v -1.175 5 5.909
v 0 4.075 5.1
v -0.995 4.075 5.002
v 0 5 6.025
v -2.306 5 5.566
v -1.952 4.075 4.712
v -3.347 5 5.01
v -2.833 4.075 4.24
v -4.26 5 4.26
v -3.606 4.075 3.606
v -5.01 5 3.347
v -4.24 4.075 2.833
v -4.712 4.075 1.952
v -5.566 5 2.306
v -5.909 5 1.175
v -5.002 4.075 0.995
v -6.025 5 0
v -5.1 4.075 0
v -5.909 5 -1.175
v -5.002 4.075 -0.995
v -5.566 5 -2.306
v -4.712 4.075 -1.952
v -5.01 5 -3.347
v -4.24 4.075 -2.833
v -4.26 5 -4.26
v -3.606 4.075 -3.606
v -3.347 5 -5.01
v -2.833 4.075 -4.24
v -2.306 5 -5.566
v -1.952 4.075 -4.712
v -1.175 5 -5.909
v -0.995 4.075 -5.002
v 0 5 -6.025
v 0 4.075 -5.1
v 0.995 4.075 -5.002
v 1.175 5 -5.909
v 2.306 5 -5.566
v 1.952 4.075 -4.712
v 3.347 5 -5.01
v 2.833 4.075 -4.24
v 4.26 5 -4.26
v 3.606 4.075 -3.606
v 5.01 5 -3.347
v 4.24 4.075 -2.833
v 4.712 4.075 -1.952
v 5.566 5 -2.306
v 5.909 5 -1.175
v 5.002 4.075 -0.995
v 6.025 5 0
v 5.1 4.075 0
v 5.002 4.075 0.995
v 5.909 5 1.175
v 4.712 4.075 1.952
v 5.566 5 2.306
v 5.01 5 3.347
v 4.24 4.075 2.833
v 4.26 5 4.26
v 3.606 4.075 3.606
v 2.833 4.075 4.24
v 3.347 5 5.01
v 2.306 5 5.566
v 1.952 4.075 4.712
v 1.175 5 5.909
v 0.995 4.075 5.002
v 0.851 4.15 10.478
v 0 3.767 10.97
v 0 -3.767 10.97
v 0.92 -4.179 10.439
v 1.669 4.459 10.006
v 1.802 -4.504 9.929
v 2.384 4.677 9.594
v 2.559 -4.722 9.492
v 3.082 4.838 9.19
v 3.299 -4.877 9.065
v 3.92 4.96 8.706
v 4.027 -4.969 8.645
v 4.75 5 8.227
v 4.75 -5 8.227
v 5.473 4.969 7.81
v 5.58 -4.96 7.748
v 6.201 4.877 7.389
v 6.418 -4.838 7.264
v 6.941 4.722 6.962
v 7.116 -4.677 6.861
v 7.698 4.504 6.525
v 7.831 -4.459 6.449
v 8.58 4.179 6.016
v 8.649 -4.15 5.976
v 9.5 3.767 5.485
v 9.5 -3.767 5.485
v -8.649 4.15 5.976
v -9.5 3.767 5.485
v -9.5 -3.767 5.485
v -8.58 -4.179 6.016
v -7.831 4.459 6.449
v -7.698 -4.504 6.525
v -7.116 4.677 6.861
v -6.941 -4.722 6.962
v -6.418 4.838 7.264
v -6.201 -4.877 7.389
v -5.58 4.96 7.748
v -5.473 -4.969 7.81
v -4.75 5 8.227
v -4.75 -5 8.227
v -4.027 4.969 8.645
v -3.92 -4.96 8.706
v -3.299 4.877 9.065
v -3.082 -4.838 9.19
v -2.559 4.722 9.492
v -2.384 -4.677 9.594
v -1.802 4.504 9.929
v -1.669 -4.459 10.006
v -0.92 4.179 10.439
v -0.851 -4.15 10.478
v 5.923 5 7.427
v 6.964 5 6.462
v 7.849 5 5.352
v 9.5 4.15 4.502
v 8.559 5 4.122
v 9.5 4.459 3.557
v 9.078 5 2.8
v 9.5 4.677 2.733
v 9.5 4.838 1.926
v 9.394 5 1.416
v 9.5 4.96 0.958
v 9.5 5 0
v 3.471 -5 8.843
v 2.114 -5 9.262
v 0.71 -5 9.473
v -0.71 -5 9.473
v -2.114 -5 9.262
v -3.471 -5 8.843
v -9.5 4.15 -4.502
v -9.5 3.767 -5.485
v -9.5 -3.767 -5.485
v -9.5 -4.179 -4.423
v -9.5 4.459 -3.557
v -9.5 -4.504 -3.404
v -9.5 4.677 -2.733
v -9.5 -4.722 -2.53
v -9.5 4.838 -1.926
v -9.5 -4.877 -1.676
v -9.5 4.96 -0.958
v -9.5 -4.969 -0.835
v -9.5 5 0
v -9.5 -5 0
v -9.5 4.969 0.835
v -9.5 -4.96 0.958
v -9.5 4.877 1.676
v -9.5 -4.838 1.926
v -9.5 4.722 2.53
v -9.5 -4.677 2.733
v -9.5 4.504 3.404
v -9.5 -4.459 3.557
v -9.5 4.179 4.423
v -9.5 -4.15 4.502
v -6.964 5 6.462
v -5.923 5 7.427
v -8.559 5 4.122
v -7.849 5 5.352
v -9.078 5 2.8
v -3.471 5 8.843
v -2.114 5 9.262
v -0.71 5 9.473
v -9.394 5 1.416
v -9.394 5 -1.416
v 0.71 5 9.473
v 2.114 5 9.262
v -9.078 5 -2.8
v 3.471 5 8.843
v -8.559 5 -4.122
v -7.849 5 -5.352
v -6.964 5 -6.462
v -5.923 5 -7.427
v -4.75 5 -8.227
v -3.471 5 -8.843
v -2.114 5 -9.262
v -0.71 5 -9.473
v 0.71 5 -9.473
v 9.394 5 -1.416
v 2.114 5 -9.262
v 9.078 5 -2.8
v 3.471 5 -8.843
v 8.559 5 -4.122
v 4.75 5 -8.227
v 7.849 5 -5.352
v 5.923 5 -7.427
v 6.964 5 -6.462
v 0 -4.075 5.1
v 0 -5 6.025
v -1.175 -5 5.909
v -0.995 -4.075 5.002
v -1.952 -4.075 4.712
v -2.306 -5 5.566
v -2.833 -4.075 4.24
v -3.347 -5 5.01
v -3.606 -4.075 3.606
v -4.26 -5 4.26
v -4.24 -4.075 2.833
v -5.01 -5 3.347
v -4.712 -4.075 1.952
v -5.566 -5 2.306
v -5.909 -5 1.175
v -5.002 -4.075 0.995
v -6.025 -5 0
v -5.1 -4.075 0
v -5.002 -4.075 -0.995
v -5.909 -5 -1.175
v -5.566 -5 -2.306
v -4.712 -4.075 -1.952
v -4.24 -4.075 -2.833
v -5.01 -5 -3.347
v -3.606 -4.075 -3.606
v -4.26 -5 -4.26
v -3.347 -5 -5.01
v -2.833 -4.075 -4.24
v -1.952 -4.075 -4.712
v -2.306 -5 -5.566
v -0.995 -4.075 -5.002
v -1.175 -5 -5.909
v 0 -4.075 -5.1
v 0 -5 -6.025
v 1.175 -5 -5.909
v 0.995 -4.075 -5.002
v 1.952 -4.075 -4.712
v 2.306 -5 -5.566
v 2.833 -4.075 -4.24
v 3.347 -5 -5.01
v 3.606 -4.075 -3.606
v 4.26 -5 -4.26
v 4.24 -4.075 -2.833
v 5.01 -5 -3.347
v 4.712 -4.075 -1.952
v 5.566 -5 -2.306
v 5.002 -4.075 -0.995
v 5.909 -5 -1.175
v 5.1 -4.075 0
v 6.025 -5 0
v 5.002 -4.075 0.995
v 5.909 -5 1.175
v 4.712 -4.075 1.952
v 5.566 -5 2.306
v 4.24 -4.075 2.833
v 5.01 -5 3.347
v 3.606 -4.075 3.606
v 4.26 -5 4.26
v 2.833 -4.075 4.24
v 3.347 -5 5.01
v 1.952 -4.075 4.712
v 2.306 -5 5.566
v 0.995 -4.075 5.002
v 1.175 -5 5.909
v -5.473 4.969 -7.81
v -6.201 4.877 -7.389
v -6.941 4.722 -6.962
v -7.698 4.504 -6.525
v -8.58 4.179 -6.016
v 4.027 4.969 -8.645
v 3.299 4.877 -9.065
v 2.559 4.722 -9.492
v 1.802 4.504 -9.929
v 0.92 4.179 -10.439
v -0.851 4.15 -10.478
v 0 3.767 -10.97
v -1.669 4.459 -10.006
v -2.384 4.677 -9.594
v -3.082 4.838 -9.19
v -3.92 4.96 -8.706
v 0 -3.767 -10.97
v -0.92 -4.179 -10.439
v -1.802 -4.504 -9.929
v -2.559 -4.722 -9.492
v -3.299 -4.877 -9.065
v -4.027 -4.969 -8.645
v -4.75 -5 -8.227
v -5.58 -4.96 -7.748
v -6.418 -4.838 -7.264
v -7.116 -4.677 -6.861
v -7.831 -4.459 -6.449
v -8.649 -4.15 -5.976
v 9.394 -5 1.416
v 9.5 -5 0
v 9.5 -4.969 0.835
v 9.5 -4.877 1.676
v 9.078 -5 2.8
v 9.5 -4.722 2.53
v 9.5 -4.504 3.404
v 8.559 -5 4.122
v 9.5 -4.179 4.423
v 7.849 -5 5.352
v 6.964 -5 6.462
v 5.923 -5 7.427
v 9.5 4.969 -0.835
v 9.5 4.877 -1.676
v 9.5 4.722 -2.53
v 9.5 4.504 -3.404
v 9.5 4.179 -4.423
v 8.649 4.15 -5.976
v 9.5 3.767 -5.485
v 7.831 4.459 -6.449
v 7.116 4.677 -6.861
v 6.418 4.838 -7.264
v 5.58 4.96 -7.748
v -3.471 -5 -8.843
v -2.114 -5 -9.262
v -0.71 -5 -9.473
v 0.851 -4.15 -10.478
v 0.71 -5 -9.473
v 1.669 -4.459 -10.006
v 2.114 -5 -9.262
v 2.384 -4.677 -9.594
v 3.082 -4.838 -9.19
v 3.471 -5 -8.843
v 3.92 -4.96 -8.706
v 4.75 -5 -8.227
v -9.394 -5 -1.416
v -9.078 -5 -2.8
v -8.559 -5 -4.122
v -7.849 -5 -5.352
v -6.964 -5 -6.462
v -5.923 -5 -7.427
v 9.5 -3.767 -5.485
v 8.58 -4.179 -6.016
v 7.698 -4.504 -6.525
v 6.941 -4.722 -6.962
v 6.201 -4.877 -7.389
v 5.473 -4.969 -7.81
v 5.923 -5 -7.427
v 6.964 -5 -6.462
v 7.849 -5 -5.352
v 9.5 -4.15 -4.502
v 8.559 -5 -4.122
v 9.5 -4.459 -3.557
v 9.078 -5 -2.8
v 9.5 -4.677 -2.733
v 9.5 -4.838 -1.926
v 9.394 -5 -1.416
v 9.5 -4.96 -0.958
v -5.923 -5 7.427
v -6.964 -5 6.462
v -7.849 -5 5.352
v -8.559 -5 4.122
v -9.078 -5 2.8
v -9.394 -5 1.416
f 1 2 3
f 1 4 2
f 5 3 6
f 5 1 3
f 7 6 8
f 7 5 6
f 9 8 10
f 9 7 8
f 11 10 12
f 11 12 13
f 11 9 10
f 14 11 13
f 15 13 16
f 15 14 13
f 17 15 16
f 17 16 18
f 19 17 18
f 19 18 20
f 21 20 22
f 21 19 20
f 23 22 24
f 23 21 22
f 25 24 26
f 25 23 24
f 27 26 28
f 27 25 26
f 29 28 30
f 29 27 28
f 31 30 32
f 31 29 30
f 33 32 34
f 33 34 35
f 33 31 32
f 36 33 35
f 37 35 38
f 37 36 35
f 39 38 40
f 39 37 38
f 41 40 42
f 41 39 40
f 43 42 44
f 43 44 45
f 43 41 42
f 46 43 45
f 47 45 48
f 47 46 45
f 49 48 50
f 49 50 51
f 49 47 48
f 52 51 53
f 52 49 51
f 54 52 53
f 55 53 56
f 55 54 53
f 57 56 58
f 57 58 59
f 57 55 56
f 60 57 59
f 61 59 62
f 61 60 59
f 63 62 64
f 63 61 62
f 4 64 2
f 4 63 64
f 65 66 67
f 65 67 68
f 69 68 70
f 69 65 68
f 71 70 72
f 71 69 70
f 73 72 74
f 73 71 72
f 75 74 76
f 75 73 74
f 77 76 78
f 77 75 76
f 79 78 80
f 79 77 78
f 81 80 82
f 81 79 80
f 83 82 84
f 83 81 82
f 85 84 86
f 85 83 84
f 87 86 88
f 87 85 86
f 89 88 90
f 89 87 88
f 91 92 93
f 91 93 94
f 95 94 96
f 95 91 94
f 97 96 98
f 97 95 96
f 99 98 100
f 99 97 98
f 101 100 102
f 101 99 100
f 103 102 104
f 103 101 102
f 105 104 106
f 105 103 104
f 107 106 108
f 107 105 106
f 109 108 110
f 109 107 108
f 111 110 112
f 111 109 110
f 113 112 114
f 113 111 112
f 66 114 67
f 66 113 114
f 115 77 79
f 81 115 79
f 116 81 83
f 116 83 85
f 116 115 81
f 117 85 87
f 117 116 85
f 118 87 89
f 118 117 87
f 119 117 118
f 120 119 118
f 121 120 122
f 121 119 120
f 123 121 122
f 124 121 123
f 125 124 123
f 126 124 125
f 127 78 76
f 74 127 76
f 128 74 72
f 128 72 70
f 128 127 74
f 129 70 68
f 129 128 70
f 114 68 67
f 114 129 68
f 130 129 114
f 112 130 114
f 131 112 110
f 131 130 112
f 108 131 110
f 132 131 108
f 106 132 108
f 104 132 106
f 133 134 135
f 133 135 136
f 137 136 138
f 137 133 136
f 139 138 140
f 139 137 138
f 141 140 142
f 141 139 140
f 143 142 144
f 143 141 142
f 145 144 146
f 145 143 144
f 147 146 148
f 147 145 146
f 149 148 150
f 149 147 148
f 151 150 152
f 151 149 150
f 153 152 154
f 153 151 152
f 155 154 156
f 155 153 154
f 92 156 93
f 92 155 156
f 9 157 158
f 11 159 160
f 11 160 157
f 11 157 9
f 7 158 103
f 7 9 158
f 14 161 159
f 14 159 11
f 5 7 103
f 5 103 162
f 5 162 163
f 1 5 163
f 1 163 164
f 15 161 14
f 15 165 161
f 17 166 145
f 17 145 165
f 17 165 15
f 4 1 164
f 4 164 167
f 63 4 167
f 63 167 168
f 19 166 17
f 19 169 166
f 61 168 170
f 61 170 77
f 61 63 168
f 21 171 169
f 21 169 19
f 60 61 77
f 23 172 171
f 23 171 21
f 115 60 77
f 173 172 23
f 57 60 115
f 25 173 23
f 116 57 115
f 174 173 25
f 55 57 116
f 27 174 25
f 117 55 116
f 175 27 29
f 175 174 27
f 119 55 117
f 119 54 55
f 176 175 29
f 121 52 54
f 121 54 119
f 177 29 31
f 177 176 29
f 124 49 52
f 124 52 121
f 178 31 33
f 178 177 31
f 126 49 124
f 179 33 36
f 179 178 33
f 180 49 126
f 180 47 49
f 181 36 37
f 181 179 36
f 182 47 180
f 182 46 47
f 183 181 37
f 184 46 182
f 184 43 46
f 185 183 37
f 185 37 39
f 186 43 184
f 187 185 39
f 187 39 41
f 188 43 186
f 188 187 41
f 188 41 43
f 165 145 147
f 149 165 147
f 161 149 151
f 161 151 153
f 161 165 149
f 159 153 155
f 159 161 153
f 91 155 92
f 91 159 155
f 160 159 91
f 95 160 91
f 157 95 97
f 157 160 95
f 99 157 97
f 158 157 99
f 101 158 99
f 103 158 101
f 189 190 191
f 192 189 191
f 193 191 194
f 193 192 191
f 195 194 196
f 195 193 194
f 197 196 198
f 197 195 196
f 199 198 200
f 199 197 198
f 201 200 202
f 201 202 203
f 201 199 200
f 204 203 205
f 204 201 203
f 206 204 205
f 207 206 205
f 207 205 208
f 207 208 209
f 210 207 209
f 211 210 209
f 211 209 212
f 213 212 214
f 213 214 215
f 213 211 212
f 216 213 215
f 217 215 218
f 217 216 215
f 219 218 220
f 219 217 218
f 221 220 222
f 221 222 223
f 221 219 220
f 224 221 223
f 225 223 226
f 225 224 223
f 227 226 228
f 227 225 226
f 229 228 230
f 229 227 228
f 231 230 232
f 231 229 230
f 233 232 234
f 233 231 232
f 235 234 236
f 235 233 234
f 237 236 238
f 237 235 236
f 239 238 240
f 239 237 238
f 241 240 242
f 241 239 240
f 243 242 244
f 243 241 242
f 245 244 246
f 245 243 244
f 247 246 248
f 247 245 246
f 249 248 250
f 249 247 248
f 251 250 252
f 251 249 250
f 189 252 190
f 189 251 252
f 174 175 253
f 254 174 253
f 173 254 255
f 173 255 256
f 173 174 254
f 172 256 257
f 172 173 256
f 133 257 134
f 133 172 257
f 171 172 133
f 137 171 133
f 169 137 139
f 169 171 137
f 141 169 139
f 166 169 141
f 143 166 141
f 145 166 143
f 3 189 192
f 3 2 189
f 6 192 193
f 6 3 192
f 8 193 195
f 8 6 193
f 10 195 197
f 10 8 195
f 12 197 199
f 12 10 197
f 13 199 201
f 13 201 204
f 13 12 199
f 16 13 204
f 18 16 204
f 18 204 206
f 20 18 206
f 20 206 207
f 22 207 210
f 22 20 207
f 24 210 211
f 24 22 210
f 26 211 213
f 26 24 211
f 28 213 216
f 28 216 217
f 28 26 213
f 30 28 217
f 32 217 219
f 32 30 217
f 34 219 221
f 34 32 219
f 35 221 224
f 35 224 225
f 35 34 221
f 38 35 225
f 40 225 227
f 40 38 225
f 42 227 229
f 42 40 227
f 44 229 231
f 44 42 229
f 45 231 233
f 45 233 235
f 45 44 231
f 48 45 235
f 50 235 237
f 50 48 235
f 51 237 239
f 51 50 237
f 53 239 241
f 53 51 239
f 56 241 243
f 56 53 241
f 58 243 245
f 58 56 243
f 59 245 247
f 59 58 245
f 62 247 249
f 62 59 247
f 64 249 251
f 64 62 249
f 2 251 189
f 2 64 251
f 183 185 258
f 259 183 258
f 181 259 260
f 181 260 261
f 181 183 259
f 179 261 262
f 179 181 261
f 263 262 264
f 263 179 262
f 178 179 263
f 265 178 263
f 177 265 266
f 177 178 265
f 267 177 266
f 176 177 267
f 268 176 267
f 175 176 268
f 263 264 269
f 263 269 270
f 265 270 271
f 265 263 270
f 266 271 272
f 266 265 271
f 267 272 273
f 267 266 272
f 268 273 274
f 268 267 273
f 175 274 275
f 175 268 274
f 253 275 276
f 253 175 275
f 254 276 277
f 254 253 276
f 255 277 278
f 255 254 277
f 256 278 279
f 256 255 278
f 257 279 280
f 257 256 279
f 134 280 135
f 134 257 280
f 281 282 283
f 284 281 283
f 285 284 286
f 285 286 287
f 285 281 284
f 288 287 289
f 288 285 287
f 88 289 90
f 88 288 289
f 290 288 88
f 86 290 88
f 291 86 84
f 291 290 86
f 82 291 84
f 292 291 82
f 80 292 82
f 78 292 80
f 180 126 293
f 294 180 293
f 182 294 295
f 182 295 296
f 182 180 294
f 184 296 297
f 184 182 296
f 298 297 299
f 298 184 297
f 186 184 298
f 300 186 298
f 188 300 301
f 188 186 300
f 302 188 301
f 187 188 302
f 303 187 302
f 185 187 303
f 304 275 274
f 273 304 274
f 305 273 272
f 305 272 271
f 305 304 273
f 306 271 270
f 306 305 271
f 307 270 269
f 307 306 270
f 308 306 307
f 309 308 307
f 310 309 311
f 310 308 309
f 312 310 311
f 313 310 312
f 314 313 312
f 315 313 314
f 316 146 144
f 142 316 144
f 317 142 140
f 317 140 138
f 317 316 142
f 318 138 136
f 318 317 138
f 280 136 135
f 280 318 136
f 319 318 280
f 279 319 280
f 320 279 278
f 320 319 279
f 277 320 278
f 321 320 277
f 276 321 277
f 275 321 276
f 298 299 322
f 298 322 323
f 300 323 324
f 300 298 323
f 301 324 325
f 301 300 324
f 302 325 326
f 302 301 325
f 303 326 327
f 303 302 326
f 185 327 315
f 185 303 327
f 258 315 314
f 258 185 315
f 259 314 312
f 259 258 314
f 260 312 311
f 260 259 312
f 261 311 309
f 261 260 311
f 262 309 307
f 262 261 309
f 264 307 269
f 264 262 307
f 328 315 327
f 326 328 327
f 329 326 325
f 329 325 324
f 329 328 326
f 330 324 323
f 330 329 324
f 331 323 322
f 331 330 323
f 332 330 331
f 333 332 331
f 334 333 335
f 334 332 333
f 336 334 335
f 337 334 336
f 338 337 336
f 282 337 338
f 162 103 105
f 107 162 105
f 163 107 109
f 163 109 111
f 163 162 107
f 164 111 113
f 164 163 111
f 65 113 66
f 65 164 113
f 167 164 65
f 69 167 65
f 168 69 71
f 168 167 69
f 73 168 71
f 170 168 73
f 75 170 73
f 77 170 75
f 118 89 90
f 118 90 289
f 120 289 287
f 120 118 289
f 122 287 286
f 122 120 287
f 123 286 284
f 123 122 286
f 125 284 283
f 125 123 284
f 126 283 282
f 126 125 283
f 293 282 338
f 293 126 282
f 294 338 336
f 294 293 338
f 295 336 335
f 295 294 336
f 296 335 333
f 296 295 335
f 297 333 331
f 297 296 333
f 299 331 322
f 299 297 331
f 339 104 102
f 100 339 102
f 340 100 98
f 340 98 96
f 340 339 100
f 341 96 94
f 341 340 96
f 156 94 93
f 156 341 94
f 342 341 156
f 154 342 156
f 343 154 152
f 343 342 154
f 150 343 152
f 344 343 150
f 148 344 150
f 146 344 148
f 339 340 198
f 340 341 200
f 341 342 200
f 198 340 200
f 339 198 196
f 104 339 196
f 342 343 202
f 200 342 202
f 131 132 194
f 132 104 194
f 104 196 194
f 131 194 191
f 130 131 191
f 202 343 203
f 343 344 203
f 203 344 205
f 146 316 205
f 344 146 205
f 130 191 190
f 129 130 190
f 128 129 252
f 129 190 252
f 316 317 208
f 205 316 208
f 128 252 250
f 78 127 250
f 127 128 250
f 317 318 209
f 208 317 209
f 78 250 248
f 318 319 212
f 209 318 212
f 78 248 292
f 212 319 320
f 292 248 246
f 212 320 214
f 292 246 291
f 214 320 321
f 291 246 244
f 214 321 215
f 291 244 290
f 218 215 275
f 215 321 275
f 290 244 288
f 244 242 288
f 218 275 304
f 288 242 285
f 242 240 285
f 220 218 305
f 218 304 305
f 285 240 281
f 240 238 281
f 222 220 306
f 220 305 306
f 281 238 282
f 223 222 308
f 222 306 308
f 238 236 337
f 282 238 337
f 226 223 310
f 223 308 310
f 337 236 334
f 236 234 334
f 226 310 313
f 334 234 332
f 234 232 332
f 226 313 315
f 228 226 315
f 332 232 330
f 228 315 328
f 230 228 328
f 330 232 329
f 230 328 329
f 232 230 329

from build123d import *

# Parameters (mm, degrees)
BOSS_EXTRUDE1_DEPTH     = 5
SKETCH5_OUTSIDE_W       = 50.974
SKETCH5_OUTSIDE_H       = 53.914
SKETCH5_OUTSIDE_R       = 9.5
CUT_EXTRUDE1_DEPTH      = 10
CUT_EXTRUDE1_DRAFT      = -50
MIRROR1_COPY_1_SKETCH_W = 50.974
MIRROR1_COPY_1_SKETCH_H = 53.914
MIRROR1_COPY_1_SKETCH_R = 9.5
MIRROR1_COPY_1_DEPTH    = 10
MIRROR1_COPY_1_DRAFT    = -50


with BuildPart() as part:
    # Sketch1 → Boss-Extrude1 (new, symmetric)
    with BuildSketch(Plane(origin=(0, 0, 0), x_dir=(1, 0, 0), z_dir=(0, 1, 0))):
        Polygon((0, 10.969655115), (-9.5, 5.484827557), (-9.5, -5.484827557), (0, -10.969655115), (9.5, -5.484827557), (9.5, 5.484827557), align=None)
    extrude(amount=BOSS_EXTRUDE1_DEPTH, both=True)

    # Sketch4 → M12 Tapped Hole1 (revolve, cut)
    with BuildSketch(Plane(origin=(0, 5, 0), x_dir=(0, 0, 1), z_dir=(1, 0, 0))):
        Polygon((0, 0), (0, 10), (6.025, 10), (5.1, 9.075), (5.1, 0.925), (6.025, 0), align=None)
    revolve(axis=Axis((0, 11.35, 0), (0, -1, 0)), mode=Mode.SUBTRACT)


with BuildPart() as cut_extrude1_tool:
    # Sketch5 outside → Cut-Extrude1 (with draft: the straight prism first)
    with BuildSketch(Plane(origin=(0, 5, 0), x_dir=(1, 0, 0), z_dir=(0, 1, 0))):
        Rectangle(SKETCH5_OUTSIDE_W, SKETCH5_OUTSIDE_H)
        Circle(SKETCH5_OUTSIDE_R, mode=Mode.SUBTRACT)
    extrude(amount=-CUT_EXTRUDE1_DEPTH)
    # Cut-Extrude1: the draft: its side faces are tilted about the plane it starts from
    cut_extrude1_sides = [cut_extrude1_tool.faces().sort_by_distance(p)[0] for p in [
        (0, 0, 26.957),
        (25.487, 0, 0),
        (0, 0, -26.957),
        (-25.487, 0, 0),
        (-9.5, 0, 0),
    ]]
    draft(cut_extrude1_sides, Plane(origin=(0, 5, 0), x_dir=(1, 0, 0), z_dir=(0, 1, 0)), CUT_EXTRUDE1_DRAFT)


with BuildPart() as part_1:
    add(part.part)

    # Cut-Extrude1: cut by cut_extrude1_tool
    add(cut_extrude1_tool.part, mode=Mode.SUBTRACT)


with BuildPart() as mirror1_copy_1_tool:
    # Mirror1 copy 1 sketch → Mirror1 copy 1 (with draft: the straight prism first)
    with BuildSketch(Plane.XZ.offset(5)):
        Rectangle(MIRROR1_COPY_1_SKETCH_W, MIRROR1_COPY_1_SKETCH_H)
        Circle(MIRROR1_COPY_1_SKETCH_R, mode=Mode.SUBTRACT)
    extrude(amount=-MIRROR1_COPY_1_DEPTH)
    # Mirror1 copy 1: the draft: its side faces are tilted about the plane it starts from
    mirror1_copy_1_sides = [mirror1_copy_1_tool.faces().sort_by_distance(p)[0] for p in [
        (0, 0, 26.957),
        (25.487, 0, 0),
        (0, 0, -26.957),
        (-25.487, 0, 0),
        (-9.5, 0, 0),
    ]]
    draft(mirror1_copy_1_sides, Plane.XZ.offset(5), MIRROR1_COPY_1_DRAFT)


with BuildPart() as part_2:
    add(part_1.part)

    # Mirror1 copy 1: cut by mirror1_copy_1_tool
    add(mirror1_copy_1_tool.part, mode=Mode.SUBTRACT)


solid = part_2.part
